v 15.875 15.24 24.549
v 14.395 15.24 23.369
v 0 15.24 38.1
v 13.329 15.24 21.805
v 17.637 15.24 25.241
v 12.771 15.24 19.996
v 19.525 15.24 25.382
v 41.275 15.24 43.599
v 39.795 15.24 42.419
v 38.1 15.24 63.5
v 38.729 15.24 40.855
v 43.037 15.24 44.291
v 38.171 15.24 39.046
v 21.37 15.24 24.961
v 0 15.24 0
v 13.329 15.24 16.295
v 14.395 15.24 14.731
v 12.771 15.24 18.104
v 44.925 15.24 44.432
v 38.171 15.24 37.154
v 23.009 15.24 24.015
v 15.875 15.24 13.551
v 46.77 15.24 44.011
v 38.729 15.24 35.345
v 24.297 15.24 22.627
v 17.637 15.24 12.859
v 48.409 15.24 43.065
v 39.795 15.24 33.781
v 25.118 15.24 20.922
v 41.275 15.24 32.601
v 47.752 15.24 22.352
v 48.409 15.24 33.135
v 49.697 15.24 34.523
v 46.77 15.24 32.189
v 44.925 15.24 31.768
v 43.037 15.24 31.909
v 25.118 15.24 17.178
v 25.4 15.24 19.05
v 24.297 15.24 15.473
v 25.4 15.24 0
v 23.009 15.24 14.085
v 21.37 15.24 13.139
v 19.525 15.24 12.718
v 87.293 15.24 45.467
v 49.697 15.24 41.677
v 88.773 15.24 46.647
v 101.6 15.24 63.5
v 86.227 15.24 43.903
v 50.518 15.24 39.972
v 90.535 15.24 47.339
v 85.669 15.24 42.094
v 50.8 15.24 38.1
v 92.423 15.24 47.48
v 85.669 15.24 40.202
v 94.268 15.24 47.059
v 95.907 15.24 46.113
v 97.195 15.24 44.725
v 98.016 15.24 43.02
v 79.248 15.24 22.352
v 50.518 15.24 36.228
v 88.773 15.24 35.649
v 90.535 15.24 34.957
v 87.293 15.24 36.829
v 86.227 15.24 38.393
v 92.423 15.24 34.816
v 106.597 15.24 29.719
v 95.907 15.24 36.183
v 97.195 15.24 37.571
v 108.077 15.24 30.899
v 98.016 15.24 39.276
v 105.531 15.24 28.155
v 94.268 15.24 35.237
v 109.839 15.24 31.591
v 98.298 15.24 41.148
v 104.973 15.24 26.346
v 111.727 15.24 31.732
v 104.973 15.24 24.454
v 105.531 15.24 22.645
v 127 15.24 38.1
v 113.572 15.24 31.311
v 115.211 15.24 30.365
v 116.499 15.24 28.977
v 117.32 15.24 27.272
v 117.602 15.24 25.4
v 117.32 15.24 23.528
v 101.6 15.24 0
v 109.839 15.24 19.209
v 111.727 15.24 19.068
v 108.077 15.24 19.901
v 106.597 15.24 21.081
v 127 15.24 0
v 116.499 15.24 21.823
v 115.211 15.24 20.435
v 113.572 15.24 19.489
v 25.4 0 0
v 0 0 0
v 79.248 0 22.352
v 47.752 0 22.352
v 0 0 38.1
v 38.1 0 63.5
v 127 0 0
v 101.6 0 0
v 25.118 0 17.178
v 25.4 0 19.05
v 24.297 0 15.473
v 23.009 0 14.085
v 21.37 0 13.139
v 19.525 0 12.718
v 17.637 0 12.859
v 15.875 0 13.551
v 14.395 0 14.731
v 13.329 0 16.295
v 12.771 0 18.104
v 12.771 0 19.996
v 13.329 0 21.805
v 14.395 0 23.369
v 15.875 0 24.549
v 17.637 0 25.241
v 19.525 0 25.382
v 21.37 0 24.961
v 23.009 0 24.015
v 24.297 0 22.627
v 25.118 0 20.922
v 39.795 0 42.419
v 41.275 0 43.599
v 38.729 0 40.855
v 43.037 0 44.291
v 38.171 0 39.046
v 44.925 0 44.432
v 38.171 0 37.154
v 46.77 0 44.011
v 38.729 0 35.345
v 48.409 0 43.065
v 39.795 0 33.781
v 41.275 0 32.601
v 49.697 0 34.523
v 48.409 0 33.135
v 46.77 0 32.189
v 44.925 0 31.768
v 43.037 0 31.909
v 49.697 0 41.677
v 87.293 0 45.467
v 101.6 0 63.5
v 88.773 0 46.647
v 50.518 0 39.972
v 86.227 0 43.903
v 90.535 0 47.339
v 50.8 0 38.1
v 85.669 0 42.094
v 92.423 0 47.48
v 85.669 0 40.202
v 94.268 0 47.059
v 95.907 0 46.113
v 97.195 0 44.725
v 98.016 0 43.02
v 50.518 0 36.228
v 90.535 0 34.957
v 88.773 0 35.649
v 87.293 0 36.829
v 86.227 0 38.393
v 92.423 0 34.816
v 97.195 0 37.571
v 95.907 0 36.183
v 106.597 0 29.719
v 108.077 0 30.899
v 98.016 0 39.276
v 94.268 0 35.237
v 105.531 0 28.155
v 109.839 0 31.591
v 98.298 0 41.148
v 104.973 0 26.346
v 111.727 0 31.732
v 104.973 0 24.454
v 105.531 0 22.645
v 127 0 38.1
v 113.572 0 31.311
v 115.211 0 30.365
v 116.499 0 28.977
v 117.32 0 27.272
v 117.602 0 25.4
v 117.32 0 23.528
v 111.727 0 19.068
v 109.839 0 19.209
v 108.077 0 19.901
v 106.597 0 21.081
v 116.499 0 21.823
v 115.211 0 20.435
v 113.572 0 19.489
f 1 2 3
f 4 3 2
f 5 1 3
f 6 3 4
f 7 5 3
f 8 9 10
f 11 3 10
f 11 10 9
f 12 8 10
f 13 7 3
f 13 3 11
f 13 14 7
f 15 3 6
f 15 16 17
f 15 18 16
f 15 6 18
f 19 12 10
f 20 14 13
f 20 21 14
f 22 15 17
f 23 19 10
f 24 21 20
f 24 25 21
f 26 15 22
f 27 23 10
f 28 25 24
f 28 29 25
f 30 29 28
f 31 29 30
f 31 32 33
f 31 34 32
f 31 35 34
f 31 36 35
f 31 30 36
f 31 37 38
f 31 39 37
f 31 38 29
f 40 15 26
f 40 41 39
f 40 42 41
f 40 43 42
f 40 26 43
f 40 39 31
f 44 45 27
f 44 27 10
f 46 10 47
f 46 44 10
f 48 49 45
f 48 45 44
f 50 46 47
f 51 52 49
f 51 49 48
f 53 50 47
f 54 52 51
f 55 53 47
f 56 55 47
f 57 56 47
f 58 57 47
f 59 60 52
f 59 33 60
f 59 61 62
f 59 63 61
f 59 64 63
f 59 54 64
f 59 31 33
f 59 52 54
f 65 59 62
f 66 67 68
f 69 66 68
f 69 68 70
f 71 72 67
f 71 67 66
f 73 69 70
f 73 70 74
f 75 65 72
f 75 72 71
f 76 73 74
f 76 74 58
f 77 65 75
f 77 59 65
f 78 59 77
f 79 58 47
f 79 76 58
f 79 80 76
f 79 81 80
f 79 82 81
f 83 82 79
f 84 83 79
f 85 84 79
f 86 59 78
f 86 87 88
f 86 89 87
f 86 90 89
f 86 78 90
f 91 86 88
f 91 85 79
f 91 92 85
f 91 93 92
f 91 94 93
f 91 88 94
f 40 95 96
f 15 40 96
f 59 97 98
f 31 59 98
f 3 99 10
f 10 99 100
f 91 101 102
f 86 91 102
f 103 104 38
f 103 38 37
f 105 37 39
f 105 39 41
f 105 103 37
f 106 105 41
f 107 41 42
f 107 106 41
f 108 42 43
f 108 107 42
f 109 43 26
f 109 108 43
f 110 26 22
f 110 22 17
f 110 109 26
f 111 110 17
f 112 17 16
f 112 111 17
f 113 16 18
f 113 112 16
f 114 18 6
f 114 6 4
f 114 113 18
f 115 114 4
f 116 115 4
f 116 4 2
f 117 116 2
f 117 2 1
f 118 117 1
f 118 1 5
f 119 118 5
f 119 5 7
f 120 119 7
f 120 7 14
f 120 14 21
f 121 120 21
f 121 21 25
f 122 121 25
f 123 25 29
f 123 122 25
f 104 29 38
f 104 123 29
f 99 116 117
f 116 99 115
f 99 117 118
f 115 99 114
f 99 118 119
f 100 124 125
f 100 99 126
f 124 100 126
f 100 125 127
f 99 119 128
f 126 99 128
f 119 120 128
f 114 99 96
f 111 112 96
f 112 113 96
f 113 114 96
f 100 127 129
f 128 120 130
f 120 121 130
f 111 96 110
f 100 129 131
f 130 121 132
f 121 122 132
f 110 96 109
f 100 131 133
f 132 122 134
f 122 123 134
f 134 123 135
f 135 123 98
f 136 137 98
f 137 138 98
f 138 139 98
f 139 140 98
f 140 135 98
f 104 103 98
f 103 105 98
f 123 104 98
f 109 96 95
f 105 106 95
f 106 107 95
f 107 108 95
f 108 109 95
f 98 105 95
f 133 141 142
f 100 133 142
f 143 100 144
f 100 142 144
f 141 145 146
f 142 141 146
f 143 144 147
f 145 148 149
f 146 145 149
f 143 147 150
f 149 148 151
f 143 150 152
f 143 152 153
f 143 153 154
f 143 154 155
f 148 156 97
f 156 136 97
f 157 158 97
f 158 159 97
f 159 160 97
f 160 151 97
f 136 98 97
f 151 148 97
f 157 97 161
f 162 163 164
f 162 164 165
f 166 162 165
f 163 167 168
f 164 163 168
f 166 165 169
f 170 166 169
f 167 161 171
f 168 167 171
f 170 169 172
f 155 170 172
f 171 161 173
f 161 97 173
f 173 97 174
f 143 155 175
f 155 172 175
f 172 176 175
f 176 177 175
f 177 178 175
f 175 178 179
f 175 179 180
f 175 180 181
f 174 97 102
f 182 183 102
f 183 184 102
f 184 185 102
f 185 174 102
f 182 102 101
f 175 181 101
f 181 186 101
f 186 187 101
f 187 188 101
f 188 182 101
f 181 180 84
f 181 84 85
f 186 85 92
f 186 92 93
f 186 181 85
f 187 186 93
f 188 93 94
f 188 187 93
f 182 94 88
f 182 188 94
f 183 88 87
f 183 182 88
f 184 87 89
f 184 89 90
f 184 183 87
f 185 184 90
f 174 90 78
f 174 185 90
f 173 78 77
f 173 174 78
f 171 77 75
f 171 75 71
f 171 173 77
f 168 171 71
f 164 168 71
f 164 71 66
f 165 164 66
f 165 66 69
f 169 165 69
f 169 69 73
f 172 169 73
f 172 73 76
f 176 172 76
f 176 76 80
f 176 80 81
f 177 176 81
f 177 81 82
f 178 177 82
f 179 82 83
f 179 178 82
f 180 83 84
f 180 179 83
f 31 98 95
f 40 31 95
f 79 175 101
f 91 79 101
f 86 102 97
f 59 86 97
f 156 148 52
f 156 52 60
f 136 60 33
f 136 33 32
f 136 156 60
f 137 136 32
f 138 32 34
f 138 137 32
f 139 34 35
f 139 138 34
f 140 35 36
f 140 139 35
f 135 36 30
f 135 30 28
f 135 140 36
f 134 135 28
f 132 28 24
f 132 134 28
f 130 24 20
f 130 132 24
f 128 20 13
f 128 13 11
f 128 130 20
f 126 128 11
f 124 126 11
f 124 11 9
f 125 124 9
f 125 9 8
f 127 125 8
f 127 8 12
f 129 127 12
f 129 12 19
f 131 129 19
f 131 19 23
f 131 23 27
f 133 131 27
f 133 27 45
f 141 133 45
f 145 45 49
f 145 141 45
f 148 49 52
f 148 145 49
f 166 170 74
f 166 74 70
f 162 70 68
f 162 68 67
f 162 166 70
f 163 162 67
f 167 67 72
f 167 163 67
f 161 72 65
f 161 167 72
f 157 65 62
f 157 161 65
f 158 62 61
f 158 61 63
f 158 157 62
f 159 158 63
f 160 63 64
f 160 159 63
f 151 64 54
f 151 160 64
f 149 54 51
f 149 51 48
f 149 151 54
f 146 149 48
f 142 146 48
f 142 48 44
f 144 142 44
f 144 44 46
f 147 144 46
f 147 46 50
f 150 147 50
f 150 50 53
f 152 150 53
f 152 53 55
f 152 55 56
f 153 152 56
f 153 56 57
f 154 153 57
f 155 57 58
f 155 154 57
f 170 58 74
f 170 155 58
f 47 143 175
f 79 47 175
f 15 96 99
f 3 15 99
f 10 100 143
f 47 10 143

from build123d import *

# Parameters (mm, degrees)
SKETCH1_R           = 6.35
BOSS_EXTRUDE1_DEPTH = 15.24


with BuildPart() as part:
    # Sketch1 → Boss-Extrude1 (new body)
    with BuildSketch(Plane(origin=(0, 0, 0), x_dir=(1, 0, 0), z_dir=(0, 1, 0))):
        Polygon((0, 0), (0, -38.1), (38.1, -63.5), (101.6, -63.5), (127, -38.1), (127, 0), (101.6, 0), (79.248, -22.352), (47.752, -22.352), (25.4, 0), align=None)
        with Locations((19.05, -19.05)):
            Circle(SKETCH1_R, mode=Mode.SUBTRACT)
        with Locations((44.45, -38.1)):
            Circle(SKETCH1_R, mode=Mode.SUBTRACT)
        with Locations((91.948, -41.148)):
            Circle(SKETCH1_R, mode=Mode.SUBTRACT)
        with Locations((111.252, -25.4)):
            Circle(SKETCH1_R, mode=Mode.SUBTRACT)
    extrude(amount=BOSS_EXTRUDE1_DEPTH)


solid = part.part
